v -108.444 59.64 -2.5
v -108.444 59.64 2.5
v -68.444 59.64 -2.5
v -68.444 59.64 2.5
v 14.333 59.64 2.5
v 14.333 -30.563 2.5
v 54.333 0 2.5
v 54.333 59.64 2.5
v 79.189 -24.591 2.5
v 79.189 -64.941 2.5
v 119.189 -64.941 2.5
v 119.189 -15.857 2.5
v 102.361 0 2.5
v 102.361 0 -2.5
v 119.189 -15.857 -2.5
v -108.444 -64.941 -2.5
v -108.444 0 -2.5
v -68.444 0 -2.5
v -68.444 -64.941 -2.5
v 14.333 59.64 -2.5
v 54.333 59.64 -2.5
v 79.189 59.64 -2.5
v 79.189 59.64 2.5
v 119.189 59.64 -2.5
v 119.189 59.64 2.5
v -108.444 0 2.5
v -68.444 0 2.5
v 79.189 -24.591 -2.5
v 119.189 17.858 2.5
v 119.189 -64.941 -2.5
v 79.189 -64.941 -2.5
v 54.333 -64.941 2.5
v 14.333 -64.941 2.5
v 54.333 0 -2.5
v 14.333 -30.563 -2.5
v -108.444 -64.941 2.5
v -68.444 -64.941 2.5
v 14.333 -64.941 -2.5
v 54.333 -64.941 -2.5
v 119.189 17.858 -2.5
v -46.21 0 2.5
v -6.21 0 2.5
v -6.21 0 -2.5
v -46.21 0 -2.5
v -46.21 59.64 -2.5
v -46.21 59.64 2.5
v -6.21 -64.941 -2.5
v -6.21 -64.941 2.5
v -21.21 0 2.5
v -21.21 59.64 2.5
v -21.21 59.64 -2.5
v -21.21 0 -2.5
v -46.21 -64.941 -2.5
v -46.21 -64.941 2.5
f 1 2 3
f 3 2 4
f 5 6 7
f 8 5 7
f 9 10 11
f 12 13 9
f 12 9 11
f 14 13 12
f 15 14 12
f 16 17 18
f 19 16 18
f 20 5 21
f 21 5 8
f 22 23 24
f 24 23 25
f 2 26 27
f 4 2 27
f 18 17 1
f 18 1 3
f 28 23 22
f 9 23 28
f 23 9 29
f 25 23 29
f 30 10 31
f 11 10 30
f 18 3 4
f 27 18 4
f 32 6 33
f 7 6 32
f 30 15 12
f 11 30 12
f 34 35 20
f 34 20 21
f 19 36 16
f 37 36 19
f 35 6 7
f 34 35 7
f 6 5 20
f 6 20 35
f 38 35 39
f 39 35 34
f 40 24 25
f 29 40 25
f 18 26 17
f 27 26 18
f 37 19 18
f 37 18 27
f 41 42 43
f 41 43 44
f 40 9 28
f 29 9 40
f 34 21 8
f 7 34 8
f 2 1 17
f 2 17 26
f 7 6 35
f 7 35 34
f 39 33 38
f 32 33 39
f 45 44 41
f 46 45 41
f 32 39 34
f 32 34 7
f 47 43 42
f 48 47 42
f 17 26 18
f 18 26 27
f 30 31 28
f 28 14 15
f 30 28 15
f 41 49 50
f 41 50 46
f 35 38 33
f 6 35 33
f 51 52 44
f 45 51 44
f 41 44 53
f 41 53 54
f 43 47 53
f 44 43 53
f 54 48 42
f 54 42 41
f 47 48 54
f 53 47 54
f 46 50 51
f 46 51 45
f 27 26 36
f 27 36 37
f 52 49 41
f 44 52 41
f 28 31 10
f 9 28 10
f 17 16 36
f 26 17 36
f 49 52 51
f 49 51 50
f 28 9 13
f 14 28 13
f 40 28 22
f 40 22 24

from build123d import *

# Parameters (mm, degrees)
ESQUISSE11_W                  = 40
ESQUISSE11_H                  = 5
EL_MENT_M_CANO_SOUD_1_DEPTH   = 59.639969087
ESQUISSE11_ON_SEGMENT_2_W     = 40
ESQUISSE11_ON_SEGMENT_2_H     = 5
EL_MENT_M_CANO_SOUD_1_2_DEPTH = 64.941299673
ESQUISSE12_W                  = 40
ESQUISSE12_H                  = 5
EL_MENT_M_CANO_SOUD_2_DEPTH   = 64.941299673
ESQUISSE14_W                  = 25
ESQUISSE14_H                  = 5
EL_MENT_M_CANO_SOUD_3_DEPTH   = 59.639969087
ESQUISSE15_W                  = 40
ESQUISSE15_H                  = 5
EL_MENT_M_CANO_SOUD_4_DEPTH   = 59.639969087
ESQUISSE15_ON_SEGMENT_2_W     = 40
ESQUISSE15_ON_SEGMENT_2_H     = 5
EL_MENT_M_CANO_SOUD_4_2_DEPTH = 64.941299673
ESQUISSE16_W                  = 40
ESQUISSE16_H                  = 5
EL_MENT_M_CANO_SOUD_5_DEPTH   = 59.639969087
ESQUISSE16_ON_SEGMENT_2_W     = 40
ESQUISSE16_ON_SEGMENT_2_H     = 5
EL_MENT_M_CANO_SOUD_5_2_DEPTH = 64.941299673
ENL_V_MAT_EXTRU_1_DEPTH       = 6
BOSS_EXTRU_1_DEPTH            = 5
ENL_V_MAT_EXTRU_3_DEPTH       = 6
BOSS_EXTRU_3_DEPTH            = 5


with BuildPart() as part:
    # Esquisse11 → El_ment m_cano-soud_1 (new body)
    with BuildSketch(Plane(origin=(-88.443865269, 59.639969087, 0), x_dir=(1, 0, 0), z_dir=(0, -1, 0))):
        Rectangle(ESQUISSE11_W, ESQUISSE11_H)
    extrude(amount=EL_MENT_M_CANO_SOUD_1_DEPTH)


with BuildPart() as body_2:
    # Esquisse11 on segment 2 (carried to segment 2) → El_ment m_cano-soud_1 2 (new body)
    with BuildSketch(Plane(origin=(-88.443865269, 0, 0), x_dir=(1, 0, 0), z_dir=(0, -1, 0))):
        Rectangle(ESQUISSE11_ON_SEGMENT_2_W, ESQUISSE11_ON_SEGMENT_2_H)
    extrude(amount=EL_MENT_M_CANO_SOUD_1_2_DEPTH)


with BuildPart() as body_3:
    # Esquisse12 → El_ment m_cano-soud_2 (new body)
    with BuildSketch(Plane(origin=(-26.209931604, -64.941299673, 0), x_dir=(-1, 0, 0), z_dir=(0, 1, 0))):
        Rectangle(ESQUISSE12_W, ESQUISSE12_H)
    extrude(amount=EL_MENT_M_CANO_SOUD_2_DEPTH)


with BuildPart() as body_4:
    # Esquisse14 → El_ment m_cano-soud_3 (new body)
    with BuildSketch(Plane(origin=(-33.709931604, 0, 0), x_dir=(-1, 0, 0), z_dir=(0, 1, 0))):
        Rectangle(ESQUISSE14_W, ESQUISSE14_H)
    extrude(amount=EL_MENT_M_CANO_SOUD_3_DEPTH)


with BuildPart() as body_5:
    # Esquisse15 → El_ment m_cano-soud_4 (new body)
    with BuildSketch(Plane(origin=(34.333341249, 59.639969087, 0), x_dir=(1, 0, 0), z_dir=(0, -1, 0))):
        Rectangle(ESQUISSE15_W, ESQUISSE15_H)
    extrude(amount=EL_MENT_M_CANO_SOUD_4_DEPTH)

    # Esquisse17_2 → Boss.-Extru.1 (add)
    with BuildSketch(Plane.XY.offset(2.5)):
        Polygon((14.333341249, 0), (14.333341249, -30.562858598), (54.333341249, 0), align=None)
    extrude(amount=-BOSS_EXTRU_1_DEPTH)


with BuildPart() as body_6:
    # Esquisse15 on segment 2 (carried to segment 2) → El_ment m_cano-soud_4 2 (new body)
    with BuildSketch(Plane(origin=(34.333341249, 0, 0), x_dir=(1, 0, 0), z_dir=(0, -1, 0))):
        Rectangle(ESQUISSE15_ON_SEGMENT_2_W, ESQUISSE15_ON_SEGMENT_2_H)
    extrude(amount=EL_MENT_M_CANO_SOUD_4_2_DEPTH)

    # Esquisse17 → Enl_v. mat.-Extru.1 (cut, through all)
    with BuildSketch(Plane.XY.offset(2.5)):
        Polygon((14.333341249, 0), (14.333341249, -30.562858598), (54.333341249, 0), align=None)
    extrude(amount=-ENL_V_MAT_EXTRU_1_DEPTH, mode=Mode.SUBTRACT)


with BuildPart() as body_7:
    # Esquisse16 → El_ment m_cano-soud_5 (new body)
    with BuildSketch(Plane(origin=(99.188796365, 59.639969087, 0), x_dir=(1, 0, 0), z_dir=(0, -1, 0))):
        Rectangle(ESQUISSE16_W, ESQUISSE16_H)
    extrude(amount=EL_MENT_M_CANO_SOUD_5_DEPTH)


with BuildPart() as body_8:
    # Esquisse16 on segment 2 (carried to segment 2) → El_ment m_cano-soud_5 2 (new body)
    with BuildSketch(Plane(origin=(99.188796365, 0, 0), x_dir=(1, 0, 0), z_dir=(0, -1, 0))):
        Rectangle(ESQUISSE16_ON_SEGMENT_2_W, ESQUISSE16_ON_SEGMENT_2_H)
    extrude(amount=EL_MENT_M_CANO_SOUD_5_2_DEPTH)


with BuildPart() as enl_v_mat_extru_3_tool:
    # Esquisse19 → Enl_v. mat.-Extru.3 (new body, through all)
    with BuildSketch(Plane.XY.offset(2.5)):
        Polygon((79.188796365, 17.858360365), (79.188796365, -24.591353025), (102.361016916, 0), (119.188796365, -15.856671912), (119.188796365, 17.858360365), align=None)
    extrude(amount=-ENL_V_MAT_EXTRU_3_DEPTH)


with BuildPart() as body_7_1:
    add(body_7.part)

    # Enl_v. mat.-Extru.3: cut by enl_v_mat_extru_3_tool
    add(enl_v_mat_extru_3_tool.part, mode=Mode.SUBTRACT)

    # Esquisse21 → Boss.-Extru.3 (add)
    with BuildSketch(Plane.XY.offset(2.5)):
        Polygon((79.188796365, 17.858360365), (79.188796365, -24.591353025), (119.188796365, 17.858360365), align=None)
    extrude(amount=-BOSS_EXTRU_3_DEPTH)


with BuildPart() as body_8_1:
    add(body_8.part)

    # Enl_v. mat.-Extru.3: cut by enl_v_mat_extru_3_tool
    add(enl_v_mat_extru_3_tool.part, mode=Mode.SUBTRACT)


solid = Compound([part.part, body_2.part, body_3.part, body_4.part, body_5.part, body_6.part, body_7_1.part, body_8_1.part])
